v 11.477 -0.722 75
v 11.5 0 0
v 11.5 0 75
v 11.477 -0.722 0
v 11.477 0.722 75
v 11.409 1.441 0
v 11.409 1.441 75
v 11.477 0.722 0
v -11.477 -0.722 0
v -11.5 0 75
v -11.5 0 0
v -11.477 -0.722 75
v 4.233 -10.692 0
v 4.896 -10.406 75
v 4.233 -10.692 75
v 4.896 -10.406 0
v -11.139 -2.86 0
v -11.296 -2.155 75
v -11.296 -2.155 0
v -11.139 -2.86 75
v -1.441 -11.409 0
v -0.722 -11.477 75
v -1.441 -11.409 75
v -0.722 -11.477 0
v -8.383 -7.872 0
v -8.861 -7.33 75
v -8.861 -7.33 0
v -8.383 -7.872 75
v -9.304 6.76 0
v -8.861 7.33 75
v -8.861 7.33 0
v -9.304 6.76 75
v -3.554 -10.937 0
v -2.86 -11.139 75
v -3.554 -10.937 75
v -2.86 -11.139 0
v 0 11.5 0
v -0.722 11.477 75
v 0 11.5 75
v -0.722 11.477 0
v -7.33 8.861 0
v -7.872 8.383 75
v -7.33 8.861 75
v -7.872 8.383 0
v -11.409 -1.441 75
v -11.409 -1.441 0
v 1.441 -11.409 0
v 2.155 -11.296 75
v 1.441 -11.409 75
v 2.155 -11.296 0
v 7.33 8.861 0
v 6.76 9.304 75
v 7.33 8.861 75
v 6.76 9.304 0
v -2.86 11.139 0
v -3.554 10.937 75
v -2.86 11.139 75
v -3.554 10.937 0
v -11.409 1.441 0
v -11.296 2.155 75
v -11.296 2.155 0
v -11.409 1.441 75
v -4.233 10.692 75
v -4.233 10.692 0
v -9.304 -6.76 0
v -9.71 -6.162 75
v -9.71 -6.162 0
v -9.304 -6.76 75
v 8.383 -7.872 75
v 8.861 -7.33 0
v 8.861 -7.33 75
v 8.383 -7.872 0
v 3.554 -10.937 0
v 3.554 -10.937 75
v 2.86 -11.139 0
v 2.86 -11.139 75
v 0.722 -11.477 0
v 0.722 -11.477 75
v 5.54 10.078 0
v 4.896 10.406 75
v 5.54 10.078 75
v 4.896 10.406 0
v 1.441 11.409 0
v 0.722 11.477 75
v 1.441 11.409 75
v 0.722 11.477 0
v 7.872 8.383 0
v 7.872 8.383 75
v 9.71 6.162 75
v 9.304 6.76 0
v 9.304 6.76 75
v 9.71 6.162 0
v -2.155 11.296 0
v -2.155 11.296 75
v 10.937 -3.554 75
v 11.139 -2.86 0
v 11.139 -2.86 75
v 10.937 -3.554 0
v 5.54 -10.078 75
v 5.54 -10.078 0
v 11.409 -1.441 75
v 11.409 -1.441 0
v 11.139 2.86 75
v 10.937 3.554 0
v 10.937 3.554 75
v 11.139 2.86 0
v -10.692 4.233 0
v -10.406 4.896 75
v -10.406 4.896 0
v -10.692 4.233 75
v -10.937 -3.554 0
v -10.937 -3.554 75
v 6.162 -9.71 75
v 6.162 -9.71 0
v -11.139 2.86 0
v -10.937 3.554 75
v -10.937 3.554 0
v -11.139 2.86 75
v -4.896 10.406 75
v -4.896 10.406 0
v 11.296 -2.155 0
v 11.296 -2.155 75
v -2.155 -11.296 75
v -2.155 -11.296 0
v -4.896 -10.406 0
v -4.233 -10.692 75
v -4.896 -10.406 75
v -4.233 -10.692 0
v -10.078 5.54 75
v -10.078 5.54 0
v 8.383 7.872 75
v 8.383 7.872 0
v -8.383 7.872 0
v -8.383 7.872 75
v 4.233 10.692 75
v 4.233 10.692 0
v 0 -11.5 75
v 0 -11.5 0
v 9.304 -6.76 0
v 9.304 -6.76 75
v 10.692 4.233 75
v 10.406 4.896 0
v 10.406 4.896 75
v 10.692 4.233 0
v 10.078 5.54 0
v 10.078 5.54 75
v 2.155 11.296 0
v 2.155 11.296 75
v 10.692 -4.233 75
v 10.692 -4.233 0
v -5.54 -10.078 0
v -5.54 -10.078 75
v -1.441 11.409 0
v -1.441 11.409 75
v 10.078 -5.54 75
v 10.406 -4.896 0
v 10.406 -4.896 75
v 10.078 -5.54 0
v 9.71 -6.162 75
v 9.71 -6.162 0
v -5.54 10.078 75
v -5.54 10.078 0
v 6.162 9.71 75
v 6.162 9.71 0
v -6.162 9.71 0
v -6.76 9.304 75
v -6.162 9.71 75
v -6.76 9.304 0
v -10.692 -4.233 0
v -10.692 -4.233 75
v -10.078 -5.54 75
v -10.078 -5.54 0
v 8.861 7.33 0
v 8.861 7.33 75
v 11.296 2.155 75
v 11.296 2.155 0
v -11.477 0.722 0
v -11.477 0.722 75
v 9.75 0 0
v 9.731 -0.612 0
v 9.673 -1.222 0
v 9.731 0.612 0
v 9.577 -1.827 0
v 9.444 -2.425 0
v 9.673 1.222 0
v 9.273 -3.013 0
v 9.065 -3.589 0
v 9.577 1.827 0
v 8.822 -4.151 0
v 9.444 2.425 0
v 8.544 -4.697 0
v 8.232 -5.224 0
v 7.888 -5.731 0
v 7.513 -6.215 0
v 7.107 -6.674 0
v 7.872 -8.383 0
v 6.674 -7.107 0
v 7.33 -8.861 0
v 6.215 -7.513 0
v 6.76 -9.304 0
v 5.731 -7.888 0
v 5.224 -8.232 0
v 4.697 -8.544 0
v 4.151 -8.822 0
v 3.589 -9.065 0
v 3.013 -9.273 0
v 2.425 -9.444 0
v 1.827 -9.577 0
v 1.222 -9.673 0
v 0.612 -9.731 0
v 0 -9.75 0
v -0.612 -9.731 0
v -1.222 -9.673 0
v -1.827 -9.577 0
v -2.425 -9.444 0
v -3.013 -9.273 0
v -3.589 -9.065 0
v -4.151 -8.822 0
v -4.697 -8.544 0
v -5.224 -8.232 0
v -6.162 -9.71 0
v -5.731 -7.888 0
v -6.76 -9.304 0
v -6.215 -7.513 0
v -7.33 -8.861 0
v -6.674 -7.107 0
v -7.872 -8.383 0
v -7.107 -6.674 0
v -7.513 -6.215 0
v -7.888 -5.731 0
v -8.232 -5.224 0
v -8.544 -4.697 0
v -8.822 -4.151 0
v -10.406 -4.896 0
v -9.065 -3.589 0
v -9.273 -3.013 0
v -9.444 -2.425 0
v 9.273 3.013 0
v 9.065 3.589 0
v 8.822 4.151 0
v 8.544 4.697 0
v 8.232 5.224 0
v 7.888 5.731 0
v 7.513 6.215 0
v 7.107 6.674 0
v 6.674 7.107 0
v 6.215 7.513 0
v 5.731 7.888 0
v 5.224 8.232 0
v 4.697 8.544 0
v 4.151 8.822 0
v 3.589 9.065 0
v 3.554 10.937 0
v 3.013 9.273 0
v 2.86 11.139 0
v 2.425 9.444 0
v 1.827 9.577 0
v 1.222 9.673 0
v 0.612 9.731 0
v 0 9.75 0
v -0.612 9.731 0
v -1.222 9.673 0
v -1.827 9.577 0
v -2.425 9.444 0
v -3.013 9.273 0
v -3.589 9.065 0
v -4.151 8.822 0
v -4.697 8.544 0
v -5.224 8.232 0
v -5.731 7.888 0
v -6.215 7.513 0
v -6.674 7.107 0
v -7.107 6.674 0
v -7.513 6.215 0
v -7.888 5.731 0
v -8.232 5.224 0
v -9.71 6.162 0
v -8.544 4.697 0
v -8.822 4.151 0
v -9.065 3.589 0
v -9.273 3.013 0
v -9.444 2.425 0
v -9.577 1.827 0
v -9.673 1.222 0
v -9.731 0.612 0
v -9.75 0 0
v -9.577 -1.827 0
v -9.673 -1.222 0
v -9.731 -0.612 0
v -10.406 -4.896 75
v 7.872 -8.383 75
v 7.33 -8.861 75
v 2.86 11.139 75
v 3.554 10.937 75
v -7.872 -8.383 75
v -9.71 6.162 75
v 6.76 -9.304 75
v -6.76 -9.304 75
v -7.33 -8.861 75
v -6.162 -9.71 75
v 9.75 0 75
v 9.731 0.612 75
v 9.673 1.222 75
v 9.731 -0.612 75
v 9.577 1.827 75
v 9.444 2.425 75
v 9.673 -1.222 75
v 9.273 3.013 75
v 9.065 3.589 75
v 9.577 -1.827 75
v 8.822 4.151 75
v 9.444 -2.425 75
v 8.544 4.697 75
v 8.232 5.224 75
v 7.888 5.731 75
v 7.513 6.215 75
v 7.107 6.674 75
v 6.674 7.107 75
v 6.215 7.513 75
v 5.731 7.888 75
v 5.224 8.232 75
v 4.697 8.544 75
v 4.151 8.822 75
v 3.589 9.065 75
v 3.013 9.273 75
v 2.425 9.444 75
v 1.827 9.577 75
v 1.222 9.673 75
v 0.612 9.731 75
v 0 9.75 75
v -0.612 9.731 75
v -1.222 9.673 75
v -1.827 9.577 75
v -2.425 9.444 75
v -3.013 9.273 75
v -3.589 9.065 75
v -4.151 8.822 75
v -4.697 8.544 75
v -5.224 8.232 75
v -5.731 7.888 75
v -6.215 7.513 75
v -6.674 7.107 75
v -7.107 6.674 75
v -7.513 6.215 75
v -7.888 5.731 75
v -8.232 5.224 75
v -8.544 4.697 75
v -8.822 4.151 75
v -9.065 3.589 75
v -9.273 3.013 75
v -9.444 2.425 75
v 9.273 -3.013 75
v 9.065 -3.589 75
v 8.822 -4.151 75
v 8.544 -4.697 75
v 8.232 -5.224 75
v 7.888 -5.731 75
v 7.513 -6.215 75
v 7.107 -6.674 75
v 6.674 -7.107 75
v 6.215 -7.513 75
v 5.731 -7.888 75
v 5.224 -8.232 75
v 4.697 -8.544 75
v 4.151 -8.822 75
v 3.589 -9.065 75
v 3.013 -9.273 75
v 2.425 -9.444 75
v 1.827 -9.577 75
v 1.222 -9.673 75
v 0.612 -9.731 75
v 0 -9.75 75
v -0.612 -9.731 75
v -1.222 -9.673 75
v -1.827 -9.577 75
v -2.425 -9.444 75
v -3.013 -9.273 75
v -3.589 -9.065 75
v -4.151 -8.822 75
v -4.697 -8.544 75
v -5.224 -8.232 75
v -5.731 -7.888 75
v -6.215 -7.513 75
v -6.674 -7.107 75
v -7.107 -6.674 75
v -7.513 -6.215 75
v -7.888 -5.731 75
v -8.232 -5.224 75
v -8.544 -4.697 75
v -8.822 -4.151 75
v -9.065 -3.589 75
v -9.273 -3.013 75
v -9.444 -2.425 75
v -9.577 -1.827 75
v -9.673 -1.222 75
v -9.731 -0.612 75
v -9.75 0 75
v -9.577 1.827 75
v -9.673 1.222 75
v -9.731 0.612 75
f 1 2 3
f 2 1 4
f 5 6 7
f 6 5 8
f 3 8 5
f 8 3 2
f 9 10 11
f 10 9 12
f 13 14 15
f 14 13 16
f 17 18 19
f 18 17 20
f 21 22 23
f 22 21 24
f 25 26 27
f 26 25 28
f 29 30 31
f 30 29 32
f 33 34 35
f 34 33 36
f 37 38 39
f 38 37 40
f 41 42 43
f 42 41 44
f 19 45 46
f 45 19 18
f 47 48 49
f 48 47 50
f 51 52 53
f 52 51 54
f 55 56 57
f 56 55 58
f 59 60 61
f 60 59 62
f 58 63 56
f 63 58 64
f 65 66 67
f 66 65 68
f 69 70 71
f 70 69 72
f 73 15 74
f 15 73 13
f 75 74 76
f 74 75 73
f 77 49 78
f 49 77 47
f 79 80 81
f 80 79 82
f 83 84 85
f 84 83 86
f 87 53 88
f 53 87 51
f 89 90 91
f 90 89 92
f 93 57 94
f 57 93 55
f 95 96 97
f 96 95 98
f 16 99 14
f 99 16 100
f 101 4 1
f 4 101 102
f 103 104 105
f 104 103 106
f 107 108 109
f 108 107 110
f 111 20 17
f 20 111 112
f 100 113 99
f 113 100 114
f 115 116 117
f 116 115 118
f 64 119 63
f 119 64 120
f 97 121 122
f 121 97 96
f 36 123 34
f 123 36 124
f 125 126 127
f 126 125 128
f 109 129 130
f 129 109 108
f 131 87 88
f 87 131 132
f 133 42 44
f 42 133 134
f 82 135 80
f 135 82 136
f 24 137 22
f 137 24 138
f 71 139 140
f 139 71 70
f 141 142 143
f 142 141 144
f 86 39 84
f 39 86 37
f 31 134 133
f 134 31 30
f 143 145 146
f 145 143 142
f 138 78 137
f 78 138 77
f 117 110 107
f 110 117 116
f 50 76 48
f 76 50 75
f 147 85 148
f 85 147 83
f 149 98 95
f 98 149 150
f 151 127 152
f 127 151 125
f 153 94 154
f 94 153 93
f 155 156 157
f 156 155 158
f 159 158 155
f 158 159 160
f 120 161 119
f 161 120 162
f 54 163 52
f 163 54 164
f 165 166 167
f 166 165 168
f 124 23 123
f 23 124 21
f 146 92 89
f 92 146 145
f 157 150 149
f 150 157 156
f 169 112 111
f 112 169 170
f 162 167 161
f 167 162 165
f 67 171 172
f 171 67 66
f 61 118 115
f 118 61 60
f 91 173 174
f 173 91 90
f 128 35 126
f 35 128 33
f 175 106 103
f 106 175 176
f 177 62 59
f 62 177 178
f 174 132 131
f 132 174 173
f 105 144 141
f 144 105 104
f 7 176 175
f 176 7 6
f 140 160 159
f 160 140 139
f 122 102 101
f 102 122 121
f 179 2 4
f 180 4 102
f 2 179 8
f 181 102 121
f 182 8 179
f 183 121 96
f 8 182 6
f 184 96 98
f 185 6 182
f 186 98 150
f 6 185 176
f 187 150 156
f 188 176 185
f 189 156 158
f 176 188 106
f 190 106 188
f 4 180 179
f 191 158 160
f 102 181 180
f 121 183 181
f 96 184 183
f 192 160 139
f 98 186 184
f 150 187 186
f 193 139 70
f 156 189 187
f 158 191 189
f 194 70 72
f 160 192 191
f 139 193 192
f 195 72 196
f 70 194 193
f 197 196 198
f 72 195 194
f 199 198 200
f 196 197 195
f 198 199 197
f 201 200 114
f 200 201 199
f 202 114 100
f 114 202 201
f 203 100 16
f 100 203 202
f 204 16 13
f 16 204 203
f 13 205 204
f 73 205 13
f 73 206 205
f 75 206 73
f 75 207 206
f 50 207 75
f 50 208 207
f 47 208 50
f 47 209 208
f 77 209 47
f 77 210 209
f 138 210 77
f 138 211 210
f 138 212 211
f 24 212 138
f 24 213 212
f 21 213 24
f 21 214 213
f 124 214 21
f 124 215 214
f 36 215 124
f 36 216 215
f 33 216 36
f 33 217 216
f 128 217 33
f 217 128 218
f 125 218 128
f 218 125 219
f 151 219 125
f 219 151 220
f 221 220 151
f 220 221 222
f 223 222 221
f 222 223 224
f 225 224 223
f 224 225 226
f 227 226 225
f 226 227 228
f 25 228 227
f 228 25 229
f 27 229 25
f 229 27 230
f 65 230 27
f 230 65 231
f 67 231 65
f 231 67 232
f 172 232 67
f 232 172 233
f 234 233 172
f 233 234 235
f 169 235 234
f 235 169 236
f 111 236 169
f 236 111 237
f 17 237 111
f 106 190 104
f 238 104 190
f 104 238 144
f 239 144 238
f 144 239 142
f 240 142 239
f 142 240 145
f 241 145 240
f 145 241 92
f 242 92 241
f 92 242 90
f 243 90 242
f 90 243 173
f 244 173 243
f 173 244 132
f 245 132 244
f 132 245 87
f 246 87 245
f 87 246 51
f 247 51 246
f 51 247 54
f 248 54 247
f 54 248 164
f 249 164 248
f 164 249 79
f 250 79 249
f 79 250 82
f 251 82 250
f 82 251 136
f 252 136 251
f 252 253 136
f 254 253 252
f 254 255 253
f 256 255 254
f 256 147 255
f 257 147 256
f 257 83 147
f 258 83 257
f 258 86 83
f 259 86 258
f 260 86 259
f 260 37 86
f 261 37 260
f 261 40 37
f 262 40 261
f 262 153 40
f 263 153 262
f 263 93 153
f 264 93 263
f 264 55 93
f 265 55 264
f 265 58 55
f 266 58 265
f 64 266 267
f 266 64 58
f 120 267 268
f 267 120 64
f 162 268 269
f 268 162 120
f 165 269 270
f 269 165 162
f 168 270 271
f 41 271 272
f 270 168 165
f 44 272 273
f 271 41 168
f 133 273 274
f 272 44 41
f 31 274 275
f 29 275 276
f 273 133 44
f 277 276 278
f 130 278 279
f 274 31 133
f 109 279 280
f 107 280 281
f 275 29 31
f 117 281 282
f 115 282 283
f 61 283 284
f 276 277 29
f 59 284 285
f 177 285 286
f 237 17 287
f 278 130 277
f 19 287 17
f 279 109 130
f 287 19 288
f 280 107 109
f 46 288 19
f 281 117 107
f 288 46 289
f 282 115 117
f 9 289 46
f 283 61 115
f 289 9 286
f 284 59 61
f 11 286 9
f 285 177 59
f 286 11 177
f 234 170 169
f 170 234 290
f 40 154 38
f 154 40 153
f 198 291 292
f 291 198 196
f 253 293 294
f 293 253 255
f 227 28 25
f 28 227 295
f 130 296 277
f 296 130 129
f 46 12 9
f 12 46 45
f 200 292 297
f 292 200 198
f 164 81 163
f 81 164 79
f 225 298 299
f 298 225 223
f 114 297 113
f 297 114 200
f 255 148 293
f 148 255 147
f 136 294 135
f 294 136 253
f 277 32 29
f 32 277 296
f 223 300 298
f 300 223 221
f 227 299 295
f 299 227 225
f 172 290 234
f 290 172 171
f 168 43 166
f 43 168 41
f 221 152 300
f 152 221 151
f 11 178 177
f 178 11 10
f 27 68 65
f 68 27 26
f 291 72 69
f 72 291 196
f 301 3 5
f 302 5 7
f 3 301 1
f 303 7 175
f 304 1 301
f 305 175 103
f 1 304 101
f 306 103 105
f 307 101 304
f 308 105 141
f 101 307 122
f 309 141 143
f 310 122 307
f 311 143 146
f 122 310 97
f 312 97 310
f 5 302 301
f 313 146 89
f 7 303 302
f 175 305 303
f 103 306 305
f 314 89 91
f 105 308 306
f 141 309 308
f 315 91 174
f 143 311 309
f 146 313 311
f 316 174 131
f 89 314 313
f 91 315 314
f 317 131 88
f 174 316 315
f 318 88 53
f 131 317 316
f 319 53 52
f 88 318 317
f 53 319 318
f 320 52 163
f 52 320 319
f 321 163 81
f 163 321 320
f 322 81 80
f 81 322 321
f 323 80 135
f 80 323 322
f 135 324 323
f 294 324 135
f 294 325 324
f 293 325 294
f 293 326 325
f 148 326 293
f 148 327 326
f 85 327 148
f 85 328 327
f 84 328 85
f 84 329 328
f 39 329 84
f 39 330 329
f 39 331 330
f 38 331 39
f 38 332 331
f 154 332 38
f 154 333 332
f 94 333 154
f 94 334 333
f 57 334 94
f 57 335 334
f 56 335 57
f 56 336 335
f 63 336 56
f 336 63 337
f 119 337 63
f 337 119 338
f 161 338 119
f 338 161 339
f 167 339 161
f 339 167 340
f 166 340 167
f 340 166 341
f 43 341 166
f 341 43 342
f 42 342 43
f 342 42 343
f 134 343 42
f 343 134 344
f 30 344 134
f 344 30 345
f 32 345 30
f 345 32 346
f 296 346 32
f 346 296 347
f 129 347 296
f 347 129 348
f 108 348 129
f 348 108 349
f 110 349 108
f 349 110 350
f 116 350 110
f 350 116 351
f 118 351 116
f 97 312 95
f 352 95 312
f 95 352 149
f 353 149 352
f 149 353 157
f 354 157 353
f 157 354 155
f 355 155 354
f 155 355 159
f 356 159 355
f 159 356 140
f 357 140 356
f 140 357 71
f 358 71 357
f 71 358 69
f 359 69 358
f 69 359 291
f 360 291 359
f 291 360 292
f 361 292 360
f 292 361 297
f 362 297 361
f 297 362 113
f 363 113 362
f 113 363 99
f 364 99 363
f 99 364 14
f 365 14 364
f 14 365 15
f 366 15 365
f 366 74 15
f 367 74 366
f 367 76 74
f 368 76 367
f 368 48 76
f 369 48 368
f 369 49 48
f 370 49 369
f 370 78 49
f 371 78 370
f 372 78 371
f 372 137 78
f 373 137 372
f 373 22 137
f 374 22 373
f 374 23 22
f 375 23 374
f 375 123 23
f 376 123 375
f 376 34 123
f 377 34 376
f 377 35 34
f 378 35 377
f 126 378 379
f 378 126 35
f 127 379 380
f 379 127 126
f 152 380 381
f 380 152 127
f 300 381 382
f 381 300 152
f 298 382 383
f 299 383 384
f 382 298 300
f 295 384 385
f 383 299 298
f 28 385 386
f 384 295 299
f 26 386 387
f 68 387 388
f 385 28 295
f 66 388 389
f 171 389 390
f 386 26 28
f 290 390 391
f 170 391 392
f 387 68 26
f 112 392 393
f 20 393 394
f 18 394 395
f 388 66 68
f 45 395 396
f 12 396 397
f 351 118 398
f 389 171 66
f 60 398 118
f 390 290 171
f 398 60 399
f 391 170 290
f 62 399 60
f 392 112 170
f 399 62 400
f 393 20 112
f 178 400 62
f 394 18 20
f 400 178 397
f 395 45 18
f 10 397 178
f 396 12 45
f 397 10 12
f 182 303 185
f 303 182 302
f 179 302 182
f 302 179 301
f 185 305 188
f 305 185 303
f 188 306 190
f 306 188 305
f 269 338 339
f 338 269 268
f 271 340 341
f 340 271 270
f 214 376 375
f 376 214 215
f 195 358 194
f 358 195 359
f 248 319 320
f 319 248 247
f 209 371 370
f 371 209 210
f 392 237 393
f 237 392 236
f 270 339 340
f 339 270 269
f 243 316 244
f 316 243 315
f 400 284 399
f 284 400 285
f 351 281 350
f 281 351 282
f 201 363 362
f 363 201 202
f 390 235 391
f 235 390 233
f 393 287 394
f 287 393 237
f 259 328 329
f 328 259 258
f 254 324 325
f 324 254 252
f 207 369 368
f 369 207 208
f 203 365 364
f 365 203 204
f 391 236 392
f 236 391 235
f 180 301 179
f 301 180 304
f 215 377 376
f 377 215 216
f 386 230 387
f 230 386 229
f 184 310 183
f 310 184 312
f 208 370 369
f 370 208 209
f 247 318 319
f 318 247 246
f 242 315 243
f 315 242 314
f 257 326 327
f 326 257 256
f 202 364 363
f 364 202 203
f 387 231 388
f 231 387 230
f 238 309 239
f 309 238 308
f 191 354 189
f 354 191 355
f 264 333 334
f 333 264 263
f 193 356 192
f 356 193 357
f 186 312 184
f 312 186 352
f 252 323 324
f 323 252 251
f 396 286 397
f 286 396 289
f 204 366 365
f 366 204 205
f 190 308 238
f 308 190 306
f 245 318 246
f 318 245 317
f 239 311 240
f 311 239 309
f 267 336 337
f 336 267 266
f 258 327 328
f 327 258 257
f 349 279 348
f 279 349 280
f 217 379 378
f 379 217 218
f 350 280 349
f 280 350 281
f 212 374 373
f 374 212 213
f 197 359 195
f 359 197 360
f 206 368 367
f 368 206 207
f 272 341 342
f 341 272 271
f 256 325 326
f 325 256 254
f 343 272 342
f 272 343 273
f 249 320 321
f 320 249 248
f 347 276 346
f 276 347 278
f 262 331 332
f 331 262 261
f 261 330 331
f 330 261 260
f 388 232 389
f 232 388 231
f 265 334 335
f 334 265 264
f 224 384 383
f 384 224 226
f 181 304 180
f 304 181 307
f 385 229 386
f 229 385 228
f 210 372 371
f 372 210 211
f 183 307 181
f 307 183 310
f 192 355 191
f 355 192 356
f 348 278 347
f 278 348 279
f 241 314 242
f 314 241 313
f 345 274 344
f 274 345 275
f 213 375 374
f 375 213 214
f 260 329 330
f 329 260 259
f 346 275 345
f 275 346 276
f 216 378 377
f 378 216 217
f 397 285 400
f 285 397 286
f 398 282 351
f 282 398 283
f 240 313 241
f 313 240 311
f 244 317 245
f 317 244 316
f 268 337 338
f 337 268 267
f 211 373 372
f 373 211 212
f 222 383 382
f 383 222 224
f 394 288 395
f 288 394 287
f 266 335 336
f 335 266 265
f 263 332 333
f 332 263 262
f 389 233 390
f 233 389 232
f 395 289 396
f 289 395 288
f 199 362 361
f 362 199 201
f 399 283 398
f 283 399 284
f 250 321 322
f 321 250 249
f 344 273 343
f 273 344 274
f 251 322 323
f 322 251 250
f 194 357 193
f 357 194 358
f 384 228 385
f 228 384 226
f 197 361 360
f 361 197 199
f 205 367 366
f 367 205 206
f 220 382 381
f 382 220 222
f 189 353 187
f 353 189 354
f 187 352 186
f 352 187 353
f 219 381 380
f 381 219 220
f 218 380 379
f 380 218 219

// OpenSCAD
$fn = 100;

module collar(height = 12, inner = 4.5, thickness = 2) {
    difference() {
        cylinder(r = inner + thickness, h = height, $fn = $fn);
        cylinder(r = inner, h = height, $fn = $fn);
    }
}

collar(inner = 19.5/2, height = 75, thickness = (23 /2) - (19.5 / 2));
